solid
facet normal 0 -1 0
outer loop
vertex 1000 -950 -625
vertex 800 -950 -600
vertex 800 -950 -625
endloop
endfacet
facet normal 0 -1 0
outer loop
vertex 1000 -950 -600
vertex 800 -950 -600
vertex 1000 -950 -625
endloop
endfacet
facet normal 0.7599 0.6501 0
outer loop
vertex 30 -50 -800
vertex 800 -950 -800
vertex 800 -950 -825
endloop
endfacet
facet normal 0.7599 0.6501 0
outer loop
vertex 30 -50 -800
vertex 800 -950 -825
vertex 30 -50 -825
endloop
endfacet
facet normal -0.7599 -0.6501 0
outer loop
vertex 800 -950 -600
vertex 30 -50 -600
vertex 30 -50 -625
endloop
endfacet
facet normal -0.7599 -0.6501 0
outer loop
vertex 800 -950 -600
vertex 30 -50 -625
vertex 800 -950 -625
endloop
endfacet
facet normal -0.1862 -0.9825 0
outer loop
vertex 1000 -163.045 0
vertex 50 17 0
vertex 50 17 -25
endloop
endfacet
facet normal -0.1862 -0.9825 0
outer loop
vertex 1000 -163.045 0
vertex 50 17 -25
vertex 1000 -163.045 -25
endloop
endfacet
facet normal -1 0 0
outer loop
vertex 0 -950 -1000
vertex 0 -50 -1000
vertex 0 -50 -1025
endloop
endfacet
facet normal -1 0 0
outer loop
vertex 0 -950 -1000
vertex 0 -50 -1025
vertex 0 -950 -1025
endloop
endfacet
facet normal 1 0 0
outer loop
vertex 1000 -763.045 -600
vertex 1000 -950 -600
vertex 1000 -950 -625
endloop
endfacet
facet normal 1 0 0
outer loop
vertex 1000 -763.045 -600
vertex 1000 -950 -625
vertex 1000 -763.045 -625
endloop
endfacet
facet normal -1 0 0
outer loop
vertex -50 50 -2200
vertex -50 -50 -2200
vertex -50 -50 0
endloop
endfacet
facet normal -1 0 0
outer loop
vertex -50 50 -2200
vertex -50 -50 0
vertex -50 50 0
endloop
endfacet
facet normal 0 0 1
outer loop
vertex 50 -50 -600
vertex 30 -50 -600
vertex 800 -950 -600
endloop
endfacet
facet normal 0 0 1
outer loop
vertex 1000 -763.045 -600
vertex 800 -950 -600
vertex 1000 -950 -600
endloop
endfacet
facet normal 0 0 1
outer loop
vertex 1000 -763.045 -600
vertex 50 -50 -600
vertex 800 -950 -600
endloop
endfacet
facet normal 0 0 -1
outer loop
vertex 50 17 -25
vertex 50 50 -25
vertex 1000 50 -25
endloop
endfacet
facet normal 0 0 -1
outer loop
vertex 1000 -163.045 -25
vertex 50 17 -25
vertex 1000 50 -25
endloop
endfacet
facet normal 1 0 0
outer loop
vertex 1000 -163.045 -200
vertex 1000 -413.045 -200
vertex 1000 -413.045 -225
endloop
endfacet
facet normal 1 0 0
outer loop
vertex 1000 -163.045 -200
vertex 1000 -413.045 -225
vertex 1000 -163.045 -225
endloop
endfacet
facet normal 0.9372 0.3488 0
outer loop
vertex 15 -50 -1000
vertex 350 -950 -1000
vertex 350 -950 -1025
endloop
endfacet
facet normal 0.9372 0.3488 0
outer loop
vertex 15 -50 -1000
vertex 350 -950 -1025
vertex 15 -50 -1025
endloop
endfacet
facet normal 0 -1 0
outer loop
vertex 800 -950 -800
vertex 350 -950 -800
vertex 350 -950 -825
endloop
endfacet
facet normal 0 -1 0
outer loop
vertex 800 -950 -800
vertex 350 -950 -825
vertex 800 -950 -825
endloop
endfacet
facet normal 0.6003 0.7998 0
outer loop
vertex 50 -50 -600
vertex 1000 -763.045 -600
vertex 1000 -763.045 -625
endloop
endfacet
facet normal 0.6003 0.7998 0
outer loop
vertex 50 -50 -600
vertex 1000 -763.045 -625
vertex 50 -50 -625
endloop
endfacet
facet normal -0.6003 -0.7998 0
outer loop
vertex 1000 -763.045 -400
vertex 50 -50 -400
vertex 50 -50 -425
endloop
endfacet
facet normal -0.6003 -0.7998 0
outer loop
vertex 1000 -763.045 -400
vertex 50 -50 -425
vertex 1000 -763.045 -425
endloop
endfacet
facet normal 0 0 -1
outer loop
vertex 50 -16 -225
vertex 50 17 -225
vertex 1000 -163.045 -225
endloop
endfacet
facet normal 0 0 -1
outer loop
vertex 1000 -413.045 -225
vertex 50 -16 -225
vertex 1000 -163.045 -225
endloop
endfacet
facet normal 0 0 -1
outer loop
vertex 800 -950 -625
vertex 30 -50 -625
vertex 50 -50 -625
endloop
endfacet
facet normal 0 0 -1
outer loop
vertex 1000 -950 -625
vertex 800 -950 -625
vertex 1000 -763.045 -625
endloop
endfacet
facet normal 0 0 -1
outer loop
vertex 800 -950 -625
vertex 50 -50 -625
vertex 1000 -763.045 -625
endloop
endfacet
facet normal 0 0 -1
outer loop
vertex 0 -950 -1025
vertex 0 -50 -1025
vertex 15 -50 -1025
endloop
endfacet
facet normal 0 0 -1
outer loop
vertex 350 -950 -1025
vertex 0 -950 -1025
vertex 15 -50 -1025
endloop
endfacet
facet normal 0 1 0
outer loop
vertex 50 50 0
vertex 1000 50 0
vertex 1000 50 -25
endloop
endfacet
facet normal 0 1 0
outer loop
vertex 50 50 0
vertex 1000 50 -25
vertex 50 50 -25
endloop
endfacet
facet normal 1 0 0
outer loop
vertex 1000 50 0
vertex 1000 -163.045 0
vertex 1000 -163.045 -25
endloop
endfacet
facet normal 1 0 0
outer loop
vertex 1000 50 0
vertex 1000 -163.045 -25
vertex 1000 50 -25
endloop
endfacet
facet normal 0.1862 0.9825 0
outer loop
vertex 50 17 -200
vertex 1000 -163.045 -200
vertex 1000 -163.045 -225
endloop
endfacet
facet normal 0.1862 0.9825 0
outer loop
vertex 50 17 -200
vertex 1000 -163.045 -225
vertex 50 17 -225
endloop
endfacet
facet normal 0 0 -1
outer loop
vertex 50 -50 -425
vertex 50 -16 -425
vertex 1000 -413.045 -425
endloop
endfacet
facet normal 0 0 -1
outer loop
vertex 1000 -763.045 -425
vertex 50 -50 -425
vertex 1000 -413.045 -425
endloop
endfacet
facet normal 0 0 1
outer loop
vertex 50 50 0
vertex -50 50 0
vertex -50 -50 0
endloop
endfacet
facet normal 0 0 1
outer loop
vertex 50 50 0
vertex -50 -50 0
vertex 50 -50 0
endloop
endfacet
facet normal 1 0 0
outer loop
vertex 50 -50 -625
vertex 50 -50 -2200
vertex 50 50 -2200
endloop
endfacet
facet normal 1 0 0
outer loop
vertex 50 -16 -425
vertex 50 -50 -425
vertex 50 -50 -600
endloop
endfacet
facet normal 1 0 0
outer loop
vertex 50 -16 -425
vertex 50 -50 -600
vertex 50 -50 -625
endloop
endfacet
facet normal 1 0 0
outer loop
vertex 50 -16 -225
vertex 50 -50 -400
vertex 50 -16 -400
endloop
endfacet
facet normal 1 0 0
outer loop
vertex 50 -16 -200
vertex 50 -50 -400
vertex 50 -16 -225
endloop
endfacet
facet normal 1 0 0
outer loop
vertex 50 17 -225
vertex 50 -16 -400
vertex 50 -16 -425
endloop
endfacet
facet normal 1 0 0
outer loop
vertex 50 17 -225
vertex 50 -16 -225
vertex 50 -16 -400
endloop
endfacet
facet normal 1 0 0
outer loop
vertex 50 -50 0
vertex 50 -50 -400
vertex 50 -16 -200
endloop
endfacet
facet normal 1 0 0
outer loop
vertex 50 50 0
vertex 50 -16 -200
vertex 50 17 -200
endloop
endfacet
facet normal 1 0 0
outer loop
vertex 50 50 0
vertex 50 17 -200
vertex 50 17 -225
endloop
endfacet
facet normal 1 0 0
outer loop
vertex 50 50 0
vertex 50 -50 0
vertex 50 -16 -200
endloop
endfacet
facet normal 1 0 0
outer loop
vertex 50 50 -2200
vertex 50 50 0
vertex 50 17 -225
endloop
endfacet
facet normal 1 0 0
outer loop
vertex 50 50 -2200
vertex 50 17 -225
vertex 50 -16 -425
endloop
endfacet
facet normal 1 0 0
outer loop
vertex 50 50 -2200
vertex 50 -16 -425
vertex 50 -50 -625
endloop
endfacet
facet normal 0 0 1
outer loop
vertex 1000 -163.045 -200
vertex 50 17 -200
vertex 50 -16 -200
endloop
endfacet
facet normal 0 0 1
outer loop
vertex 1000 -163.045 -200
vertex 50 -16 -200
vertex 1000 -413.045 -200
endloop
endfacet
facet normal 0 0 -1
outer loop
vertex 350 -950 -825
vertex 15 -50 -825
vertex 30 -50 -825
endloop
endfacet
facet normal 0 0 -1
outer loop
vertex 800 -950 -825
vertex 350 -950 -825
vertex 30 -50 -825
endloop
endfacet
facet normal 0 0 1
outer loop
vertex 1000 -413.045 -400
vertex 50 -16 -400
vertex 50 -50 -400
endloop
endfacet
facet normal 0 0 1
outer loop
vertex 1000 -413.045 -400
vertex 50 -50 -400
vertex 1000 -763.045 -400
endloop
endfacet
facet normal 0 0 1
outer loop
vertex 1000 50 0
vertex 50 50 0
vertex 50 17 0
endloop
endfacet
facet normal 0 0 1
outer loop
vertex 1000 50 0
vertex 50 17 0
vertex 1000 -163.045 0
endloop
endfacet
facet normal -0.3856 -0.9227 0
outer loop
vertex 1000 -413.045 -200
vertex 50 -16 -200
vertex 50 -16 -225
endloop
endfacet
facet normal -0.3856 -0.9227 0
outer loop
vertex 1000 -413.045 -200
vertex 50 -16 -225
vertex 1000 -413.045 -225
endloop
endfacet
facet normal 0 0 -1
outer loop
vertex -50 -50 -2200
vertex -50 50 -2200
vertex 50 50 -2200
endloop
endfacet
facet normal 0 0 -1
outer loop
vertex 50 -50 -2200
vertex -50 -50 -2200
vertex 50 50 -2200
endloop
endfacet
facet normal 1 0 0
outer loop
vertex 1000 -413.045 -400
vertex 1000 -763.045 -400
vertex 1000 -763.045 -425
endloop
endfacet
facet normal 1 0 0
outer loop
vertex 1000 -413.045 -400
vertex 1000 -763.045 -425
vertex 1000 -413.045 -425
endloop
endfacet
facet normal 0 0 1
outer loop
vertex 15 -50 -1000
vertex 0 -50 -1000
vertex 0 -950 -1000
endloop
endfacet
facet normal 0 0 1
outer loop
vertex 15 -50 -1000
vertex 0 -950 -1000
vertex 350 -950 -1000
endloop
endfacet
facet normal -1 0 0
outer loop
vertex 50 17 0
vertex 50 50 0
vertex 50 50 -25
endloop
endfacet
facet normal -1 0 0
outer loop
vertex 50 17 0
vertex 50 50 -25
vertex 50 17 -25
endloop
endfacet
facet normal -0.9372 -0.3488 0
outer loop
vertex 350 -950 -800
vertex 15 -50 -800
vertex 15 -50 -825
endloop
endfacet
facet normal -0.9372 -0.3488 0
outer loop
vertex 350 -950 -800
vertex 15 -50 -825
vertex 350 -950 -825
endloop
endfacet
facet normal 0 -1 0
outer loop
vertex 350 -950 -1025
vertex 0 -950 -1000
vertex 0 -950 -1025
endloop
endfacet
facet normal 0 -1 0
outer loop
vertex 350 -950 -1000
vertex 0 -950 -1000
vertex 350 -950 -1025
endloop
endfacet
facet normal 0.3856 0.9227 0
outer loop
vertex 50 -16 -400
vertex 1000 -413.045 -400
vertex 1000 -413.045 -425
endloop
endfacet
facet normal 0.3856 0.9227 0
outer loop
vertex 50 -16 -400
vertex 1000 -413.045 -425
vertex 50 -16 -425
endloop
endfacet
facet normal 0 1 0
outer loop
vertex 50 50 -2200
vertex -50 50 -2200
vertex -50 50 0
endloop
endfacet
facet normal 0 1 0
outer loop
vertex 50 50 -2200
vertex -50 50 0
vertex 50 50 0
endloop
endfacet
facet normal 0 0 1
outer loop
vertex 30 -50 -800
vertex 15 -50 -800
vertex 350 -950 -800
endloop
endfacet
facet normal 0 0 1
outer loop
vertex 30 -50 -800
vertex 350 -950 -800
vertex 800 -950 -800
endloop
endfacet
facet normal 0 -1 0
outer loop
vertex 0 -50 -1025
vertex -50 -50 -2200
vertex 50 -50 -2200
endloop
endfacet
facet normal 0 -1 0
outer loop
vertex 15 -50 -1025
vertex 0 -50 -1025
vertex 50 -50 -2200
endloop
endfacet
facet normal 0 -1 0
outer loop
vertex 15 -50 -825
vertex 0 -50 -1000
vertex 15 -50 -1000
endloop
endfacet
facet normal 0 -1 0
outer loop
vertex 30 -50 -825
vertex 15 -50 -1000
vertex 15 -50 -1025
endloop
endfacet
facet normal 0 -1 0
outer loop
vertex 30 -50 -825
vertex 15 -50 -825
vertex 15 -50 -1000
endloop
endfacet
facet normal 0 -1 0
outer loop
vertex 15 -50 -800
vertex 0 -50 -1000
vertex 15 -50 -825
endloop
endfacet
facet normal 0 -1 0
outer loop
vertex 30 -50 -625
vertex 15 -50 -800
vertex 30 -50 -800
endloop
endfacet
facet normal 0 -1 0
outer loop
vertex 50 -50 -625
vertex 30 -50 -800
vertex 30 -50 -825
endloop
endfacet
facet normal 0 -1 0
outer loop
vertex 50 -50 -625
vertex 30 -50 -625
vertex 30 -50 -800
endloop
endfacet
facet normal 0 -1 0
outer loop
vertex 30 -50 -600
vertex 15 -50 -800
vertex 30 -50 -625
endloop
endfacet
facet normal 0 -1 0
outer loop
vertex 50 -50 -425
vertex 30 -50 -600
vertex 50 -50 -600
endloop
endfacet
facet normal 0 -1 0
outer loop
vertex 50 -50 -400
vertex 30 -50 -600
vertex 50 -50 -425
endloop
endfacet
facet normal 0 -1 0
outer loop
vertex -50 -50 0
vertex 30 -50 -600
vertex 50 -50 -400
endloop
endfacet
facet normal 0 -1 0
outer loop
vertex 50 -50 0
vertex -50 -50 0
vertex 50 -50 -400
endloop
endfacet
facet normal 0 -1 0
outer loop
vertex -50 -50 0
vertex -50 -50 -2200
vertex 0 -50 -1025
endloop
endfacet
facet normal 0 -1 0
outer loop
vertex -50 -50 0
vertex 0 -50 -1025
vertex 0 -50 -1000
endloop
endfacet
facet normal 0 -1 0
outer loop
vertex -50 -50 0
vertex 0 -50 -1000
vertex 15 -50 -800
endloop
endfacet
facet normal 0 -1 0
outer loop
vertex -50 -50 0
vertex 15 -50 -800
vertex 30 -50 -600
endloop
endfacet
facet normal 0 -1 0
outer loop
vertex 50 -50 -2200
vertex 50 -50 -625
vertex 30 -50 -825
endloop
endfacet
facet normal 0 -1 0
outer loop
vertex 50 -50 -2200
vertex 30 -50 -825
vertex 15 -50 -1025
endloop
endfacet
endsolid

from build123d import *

# Parameters (mm, degrees)
F0_W      = 100
F0_H      = 100
F1_DEPTH  = 2200
F3_DEPTH  = 25
F19_DEPTH = 25


with BuildPart() as f1:
    # F0 (on Top) → F1 (new body)
    with BuildSketch(Plane.XY):
        Rectangle(F0_W, F0_H)
    extrude(amount=-F1_DEPTH)

    # F14 (on offset) + F15 (on offset) + F16 (on offset) + F17 (on offset) + F18 (on offset) → F19 (join)
    with BuildSketch(Plane.XY.offset(-200)):
        Polygon((1000, -413.045367), (1000, -163.045367), (50, 17), (50, -16), align=None)
    with BuildSketch(Plane.XY.offset(-400)):
        Polygon((1000, -413.045367), (50, -16), (50, -50), (1000, -763.045367), align=None)
    with BuildSketch(Plane.XY.offset(-600)):
        Polygon((1000, -763.045367), (50, -50), (30, -50), (800, -950), (1000, -950), align=None)
    with BuildSketch(Plane.XY.offset(-800)):
        Polygon((30, -50), (15, -50), (350, -950), (800, -950), align=None)
    with BuildSketch(Plane.XY.offset(-1000)):
        Polygon((15, -50), (0, -50), (0, -950), (350, -950), align=None)
    extrude(amount=-F19_DEPTH)


with BuildPart() as f3:
    # F2 (on face) → F3 (new body)
    with BuildSketch(Plane.XY):
        Polygon((1000, 50), (50, 50), (50, 17), (1000, -163.045367), align=None)
    extrude(amount=-F3_DEPTH)


solid = Compound([f1.part, f3.part])
